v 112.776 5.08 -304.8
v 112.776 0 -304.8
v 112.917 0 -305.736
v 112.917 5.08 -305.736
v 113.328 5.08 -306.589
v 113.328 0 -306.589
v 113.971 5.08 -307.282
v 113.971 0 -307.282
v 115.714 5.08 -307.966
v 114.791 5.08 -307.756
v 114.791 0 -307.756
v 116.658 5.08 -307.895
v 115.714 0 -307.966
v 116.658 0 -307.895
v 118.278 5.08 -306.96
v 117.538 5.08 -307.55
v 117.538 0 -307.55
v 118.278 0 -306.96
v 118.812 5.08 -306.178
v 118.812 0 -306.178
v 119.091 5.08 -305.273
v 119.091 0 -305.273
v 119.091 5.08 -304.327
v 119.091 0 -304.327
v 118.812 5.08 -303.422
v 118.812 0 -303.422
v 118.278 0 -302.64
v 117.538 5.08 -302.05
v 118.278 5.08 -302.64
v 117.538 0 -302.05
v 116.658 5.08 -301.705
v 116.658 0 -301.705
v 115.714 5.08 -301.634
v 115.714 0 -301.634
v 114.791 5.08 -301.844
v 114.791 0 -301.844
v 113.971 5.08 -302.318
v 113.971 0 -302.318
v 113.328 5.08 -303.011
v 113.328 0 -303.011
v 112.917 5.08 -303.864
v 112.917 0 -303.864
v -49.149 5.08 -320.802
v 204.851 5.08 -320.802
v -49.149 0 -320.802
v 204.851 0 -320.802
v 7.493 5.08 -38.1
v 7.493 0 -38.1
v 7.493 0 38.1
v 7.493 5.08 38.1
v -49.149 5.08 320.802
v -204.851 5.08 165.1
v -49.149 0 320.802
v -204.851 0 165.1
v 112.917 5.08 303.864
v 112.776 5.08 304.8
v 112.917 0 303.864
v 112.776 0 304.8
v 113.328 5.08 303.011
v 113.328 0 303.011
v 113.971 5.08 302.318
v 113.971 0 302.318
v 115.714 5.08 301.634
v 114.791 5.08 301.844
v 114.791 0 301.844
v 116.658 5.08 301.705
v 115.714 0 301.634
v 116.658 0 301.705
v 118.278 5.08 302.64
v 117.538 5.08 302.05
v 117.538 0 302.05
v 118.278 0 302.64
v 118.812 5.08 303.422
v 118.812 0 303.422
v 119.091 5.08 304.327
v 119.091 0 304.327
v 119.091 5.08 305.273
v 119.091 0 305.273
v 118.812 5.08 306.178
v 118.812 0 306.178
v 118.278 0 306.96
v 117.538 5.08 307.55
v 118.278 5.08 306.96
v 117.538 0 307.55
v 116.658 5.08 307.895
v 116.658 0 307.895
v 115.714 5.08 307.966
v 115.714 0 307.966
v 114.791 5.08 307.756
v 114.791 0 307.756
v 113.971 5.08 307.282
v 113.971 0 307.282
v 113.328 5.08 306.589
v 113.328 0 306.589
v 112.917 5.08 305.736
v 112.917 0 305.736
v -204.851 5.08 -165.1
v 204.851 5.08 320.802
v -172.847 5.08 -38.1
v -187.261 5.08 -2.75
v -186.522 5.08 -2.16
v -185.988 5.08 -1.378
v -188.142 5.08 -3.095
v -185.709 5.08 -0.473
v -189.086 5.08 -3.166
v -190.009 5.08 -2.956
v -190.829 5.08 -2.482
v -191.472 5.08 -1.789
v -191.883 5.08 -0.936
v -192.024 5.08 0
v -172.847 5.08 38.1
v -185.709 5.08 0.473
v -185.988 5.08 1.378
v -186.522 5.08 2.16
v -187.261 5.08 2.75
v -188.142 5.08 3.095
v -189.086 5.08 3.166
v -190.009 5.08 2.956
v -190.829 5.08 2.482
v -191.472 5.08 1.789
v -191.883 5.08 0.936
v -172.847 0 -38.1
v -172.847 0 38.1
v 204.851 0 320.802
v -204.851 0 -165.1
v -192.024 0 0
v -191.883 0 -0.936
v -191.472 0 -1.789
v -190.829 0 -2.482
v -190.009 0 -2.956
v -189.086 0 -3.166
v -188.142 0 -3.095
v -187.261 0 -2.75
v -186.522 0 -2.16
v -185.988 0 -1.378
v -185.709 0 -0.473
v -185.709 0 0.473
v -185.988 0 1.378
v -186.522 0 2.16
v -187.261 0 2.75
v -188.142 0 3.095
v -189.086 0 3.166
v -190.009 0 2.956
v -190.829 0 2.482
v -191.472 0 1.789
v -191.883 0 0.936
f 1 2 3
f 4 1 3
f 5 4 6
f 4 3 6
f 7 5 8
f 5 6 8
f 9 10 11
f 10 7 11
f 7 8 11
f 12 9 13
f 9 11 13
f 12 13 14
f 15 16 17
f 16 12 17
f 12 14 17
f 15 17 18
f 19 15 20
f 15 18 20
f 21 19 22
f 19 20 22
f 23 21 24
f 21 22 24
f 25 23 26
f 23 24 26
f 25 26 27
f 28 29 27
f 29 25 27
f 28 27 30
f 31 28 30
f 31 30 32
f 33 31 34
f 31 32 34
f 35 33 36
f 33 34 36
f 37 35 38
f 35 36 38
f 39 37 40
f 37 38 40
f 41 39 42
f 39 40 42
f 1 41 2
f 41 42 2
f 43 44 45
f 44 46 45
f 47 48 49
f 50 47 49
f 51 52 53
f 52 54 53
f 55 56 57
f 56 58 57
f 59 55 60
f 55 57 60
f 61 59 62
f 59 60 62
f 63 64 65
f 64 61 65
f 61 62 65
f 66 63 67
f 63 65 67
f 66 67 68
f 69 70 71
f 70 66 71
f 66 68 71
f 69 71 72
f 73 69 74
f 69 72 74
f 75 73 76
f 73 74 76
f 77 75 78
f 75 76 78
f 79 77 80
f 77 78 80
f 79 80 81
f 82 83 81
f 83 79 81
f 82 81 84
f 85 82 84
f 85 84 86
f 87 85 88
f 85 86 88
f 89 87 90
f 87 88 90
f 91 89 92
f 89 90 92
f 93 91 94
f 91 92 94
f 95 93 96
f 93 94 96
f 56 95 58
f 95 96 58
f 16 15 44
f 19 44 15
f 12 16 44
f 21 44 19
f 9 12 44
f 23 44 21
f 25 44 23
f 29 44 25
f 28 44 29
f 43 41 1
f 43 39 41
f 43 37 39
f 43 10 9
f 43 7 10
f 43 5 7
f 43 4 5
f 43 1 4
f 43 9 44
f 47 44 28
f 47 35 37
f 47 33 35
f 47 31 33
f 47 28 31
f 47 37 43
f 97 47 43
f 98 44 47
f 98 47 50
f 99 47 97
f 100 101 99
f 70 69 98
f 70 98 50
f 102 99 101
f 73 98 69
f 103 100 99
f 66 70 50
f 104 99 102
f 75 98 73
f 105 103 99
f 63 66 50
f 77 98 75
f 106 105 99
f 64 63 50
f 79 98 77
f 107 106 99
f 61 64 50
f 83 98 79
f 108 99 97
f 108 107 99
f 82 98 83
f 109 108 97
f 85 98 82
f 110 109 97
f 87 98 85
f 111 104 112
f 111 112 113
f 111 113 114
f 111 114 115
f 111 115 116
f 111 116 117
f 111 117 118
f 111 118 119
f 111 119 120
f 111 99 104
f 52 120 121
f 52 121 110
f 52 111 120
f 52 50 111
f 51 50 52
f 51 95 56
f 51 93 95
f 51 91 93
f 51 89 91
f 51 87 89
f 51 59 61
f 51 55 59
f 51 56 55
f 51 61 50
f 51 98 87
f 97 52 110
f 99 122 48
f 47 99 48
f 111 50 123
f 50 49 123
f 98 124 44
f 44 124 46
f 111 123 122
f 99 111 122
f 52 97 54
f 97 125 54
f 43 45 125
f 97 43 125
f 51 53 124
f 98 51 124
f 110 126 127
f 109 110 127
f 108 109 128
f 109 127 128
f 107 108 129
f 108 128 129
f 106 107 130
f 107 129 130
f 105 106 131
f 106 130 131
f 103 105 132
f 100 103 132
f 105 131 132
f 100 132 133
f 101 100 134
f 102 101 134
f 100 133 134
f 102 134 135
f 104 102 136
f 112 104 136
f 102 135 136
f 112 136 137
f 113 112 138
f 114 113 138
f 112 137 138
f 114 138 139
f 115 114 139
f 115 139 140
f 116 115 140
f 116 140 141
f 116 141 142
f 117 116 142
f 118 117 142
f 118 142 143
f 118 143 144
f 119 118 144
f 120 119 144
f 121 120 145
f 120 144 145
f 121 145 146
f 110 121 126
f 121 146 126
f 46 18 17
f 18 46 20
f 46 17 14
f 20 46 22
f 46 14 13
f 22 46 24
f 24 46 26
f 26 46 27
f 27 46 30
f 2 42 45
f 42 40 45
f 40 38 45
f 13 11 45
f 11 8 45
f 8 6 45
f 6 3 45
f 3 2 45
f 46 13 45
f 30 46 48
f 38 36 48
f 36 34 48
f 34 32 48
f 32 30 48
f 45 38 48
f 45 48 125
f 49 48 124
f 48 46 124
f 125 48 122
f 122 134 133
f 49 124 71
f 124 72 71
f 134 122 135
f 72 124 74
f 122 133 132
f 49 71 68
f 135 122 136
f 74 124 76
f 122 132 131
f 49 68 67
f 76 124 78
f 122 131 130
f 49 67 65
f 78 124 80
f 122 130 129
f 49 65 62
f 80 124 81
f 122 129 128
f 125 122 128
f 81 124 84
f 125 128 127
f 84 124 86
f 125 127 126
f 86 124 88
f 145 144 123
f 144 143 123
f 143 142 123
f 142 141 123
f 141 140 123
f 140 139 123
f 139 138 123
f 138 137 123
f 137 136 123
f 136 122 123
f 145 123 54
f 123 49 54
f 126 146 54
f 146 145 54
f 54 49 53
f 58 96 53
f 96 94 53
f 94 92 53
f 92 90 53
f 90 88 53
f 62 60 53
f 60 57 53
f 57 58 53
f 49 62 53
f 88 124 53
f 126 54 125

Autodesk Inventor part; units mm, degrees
ref_plane "YZ Plane" through (0, 0, 0) normal (1, 0, 0) x (0, 1, 0)
ref_plane "XZ Plane" through (0, 0, 0) normal (0, 1, 0) x (-1, 0, 0)
ref_plane "XY Plane" through (0, 0, 0) normal (0, 0, 1) x (1, 0, 0)
sketch "Sketch7" plane through (0, 0, 0) normal (0, 1, 0) x (-1, 0, 0)
  line L0 (-204.851, 320.802) -> (-204.851, -320.802)
  line L1 (-204.851, -320.802) -> (49.149, -320.802)
  line L2 (204.851, -165.1) -> (204.851, 165.1)
  line L3 (49.149, 320.802) -> (-204.851, 320.802)
  line L4 (-286.7914, 0) -> (286.7914, 0) projected
  line L5 (0, -449.1228) -> (0, 449.1228) projected
  line L6 (172.847, -38.1) -> (-7.493, -38.1)
  line L7 (-7.493, -38.1) -> (-7.493, 38.1)
  line L8 (-7.493, 38.1) -> (172.847, 38.1)
  line L9 (172.847, 38.1) -> (172.847, -38.1)
  circle A0 centre (188.849, 0) radius 3.175
  circle A1 centre (-115.951, 304.8) radius 3.175
  circle A2 centre (-115.951, -304.8) radius 3.175
  line L10 (-27.051, -320.802) -> (-27.051, 320.802) construction
  line L11 (204.851, -70.0665) -> (-27.051, -70.0665) construction
  line L12 (204.851, 0) -> (143.8291, 0) construction
  line L13 (49.149, -320.802) -> (204.851, -165.1)
  line L14 (204.851, 165.1) -> (49.149, 320.802)
  point P0 (0, 0)
  dimension "d22" = 76.2
  dimension "d23" = 180.34
  dimension "d24" = 32.004
  dimension "d25" = 6.35
  dimension "d26" = 16.002
  dimension "d27" = 16.002
  dimension "d28" = 165.1
  dimension "d29" = 641.604
  dimension "d31" = 330.2
  dimension "d32" = 254
  dimension "d36" = 45
  dimension "d37" = 220.1959
  dimension "d38" = 231.902
extrude "Extrusion5" add sketch "Sketch7" along normal blind 5.08 contours L3 L5 L8 L7 L4 L0 | L4 L7 L6 L5 L1 L0 | L3 L14 L2 L4 A0 L9 L8 L5 | L5 L6 L9 L4 A0 L2 L13 L1
equation "\"d28\" = 0.5 * SideLength"
equation "\"d31\" = SideLength"
equation "\"SideLength\" = 330.2"
properties part number "eLECTORNICS bOARD"
